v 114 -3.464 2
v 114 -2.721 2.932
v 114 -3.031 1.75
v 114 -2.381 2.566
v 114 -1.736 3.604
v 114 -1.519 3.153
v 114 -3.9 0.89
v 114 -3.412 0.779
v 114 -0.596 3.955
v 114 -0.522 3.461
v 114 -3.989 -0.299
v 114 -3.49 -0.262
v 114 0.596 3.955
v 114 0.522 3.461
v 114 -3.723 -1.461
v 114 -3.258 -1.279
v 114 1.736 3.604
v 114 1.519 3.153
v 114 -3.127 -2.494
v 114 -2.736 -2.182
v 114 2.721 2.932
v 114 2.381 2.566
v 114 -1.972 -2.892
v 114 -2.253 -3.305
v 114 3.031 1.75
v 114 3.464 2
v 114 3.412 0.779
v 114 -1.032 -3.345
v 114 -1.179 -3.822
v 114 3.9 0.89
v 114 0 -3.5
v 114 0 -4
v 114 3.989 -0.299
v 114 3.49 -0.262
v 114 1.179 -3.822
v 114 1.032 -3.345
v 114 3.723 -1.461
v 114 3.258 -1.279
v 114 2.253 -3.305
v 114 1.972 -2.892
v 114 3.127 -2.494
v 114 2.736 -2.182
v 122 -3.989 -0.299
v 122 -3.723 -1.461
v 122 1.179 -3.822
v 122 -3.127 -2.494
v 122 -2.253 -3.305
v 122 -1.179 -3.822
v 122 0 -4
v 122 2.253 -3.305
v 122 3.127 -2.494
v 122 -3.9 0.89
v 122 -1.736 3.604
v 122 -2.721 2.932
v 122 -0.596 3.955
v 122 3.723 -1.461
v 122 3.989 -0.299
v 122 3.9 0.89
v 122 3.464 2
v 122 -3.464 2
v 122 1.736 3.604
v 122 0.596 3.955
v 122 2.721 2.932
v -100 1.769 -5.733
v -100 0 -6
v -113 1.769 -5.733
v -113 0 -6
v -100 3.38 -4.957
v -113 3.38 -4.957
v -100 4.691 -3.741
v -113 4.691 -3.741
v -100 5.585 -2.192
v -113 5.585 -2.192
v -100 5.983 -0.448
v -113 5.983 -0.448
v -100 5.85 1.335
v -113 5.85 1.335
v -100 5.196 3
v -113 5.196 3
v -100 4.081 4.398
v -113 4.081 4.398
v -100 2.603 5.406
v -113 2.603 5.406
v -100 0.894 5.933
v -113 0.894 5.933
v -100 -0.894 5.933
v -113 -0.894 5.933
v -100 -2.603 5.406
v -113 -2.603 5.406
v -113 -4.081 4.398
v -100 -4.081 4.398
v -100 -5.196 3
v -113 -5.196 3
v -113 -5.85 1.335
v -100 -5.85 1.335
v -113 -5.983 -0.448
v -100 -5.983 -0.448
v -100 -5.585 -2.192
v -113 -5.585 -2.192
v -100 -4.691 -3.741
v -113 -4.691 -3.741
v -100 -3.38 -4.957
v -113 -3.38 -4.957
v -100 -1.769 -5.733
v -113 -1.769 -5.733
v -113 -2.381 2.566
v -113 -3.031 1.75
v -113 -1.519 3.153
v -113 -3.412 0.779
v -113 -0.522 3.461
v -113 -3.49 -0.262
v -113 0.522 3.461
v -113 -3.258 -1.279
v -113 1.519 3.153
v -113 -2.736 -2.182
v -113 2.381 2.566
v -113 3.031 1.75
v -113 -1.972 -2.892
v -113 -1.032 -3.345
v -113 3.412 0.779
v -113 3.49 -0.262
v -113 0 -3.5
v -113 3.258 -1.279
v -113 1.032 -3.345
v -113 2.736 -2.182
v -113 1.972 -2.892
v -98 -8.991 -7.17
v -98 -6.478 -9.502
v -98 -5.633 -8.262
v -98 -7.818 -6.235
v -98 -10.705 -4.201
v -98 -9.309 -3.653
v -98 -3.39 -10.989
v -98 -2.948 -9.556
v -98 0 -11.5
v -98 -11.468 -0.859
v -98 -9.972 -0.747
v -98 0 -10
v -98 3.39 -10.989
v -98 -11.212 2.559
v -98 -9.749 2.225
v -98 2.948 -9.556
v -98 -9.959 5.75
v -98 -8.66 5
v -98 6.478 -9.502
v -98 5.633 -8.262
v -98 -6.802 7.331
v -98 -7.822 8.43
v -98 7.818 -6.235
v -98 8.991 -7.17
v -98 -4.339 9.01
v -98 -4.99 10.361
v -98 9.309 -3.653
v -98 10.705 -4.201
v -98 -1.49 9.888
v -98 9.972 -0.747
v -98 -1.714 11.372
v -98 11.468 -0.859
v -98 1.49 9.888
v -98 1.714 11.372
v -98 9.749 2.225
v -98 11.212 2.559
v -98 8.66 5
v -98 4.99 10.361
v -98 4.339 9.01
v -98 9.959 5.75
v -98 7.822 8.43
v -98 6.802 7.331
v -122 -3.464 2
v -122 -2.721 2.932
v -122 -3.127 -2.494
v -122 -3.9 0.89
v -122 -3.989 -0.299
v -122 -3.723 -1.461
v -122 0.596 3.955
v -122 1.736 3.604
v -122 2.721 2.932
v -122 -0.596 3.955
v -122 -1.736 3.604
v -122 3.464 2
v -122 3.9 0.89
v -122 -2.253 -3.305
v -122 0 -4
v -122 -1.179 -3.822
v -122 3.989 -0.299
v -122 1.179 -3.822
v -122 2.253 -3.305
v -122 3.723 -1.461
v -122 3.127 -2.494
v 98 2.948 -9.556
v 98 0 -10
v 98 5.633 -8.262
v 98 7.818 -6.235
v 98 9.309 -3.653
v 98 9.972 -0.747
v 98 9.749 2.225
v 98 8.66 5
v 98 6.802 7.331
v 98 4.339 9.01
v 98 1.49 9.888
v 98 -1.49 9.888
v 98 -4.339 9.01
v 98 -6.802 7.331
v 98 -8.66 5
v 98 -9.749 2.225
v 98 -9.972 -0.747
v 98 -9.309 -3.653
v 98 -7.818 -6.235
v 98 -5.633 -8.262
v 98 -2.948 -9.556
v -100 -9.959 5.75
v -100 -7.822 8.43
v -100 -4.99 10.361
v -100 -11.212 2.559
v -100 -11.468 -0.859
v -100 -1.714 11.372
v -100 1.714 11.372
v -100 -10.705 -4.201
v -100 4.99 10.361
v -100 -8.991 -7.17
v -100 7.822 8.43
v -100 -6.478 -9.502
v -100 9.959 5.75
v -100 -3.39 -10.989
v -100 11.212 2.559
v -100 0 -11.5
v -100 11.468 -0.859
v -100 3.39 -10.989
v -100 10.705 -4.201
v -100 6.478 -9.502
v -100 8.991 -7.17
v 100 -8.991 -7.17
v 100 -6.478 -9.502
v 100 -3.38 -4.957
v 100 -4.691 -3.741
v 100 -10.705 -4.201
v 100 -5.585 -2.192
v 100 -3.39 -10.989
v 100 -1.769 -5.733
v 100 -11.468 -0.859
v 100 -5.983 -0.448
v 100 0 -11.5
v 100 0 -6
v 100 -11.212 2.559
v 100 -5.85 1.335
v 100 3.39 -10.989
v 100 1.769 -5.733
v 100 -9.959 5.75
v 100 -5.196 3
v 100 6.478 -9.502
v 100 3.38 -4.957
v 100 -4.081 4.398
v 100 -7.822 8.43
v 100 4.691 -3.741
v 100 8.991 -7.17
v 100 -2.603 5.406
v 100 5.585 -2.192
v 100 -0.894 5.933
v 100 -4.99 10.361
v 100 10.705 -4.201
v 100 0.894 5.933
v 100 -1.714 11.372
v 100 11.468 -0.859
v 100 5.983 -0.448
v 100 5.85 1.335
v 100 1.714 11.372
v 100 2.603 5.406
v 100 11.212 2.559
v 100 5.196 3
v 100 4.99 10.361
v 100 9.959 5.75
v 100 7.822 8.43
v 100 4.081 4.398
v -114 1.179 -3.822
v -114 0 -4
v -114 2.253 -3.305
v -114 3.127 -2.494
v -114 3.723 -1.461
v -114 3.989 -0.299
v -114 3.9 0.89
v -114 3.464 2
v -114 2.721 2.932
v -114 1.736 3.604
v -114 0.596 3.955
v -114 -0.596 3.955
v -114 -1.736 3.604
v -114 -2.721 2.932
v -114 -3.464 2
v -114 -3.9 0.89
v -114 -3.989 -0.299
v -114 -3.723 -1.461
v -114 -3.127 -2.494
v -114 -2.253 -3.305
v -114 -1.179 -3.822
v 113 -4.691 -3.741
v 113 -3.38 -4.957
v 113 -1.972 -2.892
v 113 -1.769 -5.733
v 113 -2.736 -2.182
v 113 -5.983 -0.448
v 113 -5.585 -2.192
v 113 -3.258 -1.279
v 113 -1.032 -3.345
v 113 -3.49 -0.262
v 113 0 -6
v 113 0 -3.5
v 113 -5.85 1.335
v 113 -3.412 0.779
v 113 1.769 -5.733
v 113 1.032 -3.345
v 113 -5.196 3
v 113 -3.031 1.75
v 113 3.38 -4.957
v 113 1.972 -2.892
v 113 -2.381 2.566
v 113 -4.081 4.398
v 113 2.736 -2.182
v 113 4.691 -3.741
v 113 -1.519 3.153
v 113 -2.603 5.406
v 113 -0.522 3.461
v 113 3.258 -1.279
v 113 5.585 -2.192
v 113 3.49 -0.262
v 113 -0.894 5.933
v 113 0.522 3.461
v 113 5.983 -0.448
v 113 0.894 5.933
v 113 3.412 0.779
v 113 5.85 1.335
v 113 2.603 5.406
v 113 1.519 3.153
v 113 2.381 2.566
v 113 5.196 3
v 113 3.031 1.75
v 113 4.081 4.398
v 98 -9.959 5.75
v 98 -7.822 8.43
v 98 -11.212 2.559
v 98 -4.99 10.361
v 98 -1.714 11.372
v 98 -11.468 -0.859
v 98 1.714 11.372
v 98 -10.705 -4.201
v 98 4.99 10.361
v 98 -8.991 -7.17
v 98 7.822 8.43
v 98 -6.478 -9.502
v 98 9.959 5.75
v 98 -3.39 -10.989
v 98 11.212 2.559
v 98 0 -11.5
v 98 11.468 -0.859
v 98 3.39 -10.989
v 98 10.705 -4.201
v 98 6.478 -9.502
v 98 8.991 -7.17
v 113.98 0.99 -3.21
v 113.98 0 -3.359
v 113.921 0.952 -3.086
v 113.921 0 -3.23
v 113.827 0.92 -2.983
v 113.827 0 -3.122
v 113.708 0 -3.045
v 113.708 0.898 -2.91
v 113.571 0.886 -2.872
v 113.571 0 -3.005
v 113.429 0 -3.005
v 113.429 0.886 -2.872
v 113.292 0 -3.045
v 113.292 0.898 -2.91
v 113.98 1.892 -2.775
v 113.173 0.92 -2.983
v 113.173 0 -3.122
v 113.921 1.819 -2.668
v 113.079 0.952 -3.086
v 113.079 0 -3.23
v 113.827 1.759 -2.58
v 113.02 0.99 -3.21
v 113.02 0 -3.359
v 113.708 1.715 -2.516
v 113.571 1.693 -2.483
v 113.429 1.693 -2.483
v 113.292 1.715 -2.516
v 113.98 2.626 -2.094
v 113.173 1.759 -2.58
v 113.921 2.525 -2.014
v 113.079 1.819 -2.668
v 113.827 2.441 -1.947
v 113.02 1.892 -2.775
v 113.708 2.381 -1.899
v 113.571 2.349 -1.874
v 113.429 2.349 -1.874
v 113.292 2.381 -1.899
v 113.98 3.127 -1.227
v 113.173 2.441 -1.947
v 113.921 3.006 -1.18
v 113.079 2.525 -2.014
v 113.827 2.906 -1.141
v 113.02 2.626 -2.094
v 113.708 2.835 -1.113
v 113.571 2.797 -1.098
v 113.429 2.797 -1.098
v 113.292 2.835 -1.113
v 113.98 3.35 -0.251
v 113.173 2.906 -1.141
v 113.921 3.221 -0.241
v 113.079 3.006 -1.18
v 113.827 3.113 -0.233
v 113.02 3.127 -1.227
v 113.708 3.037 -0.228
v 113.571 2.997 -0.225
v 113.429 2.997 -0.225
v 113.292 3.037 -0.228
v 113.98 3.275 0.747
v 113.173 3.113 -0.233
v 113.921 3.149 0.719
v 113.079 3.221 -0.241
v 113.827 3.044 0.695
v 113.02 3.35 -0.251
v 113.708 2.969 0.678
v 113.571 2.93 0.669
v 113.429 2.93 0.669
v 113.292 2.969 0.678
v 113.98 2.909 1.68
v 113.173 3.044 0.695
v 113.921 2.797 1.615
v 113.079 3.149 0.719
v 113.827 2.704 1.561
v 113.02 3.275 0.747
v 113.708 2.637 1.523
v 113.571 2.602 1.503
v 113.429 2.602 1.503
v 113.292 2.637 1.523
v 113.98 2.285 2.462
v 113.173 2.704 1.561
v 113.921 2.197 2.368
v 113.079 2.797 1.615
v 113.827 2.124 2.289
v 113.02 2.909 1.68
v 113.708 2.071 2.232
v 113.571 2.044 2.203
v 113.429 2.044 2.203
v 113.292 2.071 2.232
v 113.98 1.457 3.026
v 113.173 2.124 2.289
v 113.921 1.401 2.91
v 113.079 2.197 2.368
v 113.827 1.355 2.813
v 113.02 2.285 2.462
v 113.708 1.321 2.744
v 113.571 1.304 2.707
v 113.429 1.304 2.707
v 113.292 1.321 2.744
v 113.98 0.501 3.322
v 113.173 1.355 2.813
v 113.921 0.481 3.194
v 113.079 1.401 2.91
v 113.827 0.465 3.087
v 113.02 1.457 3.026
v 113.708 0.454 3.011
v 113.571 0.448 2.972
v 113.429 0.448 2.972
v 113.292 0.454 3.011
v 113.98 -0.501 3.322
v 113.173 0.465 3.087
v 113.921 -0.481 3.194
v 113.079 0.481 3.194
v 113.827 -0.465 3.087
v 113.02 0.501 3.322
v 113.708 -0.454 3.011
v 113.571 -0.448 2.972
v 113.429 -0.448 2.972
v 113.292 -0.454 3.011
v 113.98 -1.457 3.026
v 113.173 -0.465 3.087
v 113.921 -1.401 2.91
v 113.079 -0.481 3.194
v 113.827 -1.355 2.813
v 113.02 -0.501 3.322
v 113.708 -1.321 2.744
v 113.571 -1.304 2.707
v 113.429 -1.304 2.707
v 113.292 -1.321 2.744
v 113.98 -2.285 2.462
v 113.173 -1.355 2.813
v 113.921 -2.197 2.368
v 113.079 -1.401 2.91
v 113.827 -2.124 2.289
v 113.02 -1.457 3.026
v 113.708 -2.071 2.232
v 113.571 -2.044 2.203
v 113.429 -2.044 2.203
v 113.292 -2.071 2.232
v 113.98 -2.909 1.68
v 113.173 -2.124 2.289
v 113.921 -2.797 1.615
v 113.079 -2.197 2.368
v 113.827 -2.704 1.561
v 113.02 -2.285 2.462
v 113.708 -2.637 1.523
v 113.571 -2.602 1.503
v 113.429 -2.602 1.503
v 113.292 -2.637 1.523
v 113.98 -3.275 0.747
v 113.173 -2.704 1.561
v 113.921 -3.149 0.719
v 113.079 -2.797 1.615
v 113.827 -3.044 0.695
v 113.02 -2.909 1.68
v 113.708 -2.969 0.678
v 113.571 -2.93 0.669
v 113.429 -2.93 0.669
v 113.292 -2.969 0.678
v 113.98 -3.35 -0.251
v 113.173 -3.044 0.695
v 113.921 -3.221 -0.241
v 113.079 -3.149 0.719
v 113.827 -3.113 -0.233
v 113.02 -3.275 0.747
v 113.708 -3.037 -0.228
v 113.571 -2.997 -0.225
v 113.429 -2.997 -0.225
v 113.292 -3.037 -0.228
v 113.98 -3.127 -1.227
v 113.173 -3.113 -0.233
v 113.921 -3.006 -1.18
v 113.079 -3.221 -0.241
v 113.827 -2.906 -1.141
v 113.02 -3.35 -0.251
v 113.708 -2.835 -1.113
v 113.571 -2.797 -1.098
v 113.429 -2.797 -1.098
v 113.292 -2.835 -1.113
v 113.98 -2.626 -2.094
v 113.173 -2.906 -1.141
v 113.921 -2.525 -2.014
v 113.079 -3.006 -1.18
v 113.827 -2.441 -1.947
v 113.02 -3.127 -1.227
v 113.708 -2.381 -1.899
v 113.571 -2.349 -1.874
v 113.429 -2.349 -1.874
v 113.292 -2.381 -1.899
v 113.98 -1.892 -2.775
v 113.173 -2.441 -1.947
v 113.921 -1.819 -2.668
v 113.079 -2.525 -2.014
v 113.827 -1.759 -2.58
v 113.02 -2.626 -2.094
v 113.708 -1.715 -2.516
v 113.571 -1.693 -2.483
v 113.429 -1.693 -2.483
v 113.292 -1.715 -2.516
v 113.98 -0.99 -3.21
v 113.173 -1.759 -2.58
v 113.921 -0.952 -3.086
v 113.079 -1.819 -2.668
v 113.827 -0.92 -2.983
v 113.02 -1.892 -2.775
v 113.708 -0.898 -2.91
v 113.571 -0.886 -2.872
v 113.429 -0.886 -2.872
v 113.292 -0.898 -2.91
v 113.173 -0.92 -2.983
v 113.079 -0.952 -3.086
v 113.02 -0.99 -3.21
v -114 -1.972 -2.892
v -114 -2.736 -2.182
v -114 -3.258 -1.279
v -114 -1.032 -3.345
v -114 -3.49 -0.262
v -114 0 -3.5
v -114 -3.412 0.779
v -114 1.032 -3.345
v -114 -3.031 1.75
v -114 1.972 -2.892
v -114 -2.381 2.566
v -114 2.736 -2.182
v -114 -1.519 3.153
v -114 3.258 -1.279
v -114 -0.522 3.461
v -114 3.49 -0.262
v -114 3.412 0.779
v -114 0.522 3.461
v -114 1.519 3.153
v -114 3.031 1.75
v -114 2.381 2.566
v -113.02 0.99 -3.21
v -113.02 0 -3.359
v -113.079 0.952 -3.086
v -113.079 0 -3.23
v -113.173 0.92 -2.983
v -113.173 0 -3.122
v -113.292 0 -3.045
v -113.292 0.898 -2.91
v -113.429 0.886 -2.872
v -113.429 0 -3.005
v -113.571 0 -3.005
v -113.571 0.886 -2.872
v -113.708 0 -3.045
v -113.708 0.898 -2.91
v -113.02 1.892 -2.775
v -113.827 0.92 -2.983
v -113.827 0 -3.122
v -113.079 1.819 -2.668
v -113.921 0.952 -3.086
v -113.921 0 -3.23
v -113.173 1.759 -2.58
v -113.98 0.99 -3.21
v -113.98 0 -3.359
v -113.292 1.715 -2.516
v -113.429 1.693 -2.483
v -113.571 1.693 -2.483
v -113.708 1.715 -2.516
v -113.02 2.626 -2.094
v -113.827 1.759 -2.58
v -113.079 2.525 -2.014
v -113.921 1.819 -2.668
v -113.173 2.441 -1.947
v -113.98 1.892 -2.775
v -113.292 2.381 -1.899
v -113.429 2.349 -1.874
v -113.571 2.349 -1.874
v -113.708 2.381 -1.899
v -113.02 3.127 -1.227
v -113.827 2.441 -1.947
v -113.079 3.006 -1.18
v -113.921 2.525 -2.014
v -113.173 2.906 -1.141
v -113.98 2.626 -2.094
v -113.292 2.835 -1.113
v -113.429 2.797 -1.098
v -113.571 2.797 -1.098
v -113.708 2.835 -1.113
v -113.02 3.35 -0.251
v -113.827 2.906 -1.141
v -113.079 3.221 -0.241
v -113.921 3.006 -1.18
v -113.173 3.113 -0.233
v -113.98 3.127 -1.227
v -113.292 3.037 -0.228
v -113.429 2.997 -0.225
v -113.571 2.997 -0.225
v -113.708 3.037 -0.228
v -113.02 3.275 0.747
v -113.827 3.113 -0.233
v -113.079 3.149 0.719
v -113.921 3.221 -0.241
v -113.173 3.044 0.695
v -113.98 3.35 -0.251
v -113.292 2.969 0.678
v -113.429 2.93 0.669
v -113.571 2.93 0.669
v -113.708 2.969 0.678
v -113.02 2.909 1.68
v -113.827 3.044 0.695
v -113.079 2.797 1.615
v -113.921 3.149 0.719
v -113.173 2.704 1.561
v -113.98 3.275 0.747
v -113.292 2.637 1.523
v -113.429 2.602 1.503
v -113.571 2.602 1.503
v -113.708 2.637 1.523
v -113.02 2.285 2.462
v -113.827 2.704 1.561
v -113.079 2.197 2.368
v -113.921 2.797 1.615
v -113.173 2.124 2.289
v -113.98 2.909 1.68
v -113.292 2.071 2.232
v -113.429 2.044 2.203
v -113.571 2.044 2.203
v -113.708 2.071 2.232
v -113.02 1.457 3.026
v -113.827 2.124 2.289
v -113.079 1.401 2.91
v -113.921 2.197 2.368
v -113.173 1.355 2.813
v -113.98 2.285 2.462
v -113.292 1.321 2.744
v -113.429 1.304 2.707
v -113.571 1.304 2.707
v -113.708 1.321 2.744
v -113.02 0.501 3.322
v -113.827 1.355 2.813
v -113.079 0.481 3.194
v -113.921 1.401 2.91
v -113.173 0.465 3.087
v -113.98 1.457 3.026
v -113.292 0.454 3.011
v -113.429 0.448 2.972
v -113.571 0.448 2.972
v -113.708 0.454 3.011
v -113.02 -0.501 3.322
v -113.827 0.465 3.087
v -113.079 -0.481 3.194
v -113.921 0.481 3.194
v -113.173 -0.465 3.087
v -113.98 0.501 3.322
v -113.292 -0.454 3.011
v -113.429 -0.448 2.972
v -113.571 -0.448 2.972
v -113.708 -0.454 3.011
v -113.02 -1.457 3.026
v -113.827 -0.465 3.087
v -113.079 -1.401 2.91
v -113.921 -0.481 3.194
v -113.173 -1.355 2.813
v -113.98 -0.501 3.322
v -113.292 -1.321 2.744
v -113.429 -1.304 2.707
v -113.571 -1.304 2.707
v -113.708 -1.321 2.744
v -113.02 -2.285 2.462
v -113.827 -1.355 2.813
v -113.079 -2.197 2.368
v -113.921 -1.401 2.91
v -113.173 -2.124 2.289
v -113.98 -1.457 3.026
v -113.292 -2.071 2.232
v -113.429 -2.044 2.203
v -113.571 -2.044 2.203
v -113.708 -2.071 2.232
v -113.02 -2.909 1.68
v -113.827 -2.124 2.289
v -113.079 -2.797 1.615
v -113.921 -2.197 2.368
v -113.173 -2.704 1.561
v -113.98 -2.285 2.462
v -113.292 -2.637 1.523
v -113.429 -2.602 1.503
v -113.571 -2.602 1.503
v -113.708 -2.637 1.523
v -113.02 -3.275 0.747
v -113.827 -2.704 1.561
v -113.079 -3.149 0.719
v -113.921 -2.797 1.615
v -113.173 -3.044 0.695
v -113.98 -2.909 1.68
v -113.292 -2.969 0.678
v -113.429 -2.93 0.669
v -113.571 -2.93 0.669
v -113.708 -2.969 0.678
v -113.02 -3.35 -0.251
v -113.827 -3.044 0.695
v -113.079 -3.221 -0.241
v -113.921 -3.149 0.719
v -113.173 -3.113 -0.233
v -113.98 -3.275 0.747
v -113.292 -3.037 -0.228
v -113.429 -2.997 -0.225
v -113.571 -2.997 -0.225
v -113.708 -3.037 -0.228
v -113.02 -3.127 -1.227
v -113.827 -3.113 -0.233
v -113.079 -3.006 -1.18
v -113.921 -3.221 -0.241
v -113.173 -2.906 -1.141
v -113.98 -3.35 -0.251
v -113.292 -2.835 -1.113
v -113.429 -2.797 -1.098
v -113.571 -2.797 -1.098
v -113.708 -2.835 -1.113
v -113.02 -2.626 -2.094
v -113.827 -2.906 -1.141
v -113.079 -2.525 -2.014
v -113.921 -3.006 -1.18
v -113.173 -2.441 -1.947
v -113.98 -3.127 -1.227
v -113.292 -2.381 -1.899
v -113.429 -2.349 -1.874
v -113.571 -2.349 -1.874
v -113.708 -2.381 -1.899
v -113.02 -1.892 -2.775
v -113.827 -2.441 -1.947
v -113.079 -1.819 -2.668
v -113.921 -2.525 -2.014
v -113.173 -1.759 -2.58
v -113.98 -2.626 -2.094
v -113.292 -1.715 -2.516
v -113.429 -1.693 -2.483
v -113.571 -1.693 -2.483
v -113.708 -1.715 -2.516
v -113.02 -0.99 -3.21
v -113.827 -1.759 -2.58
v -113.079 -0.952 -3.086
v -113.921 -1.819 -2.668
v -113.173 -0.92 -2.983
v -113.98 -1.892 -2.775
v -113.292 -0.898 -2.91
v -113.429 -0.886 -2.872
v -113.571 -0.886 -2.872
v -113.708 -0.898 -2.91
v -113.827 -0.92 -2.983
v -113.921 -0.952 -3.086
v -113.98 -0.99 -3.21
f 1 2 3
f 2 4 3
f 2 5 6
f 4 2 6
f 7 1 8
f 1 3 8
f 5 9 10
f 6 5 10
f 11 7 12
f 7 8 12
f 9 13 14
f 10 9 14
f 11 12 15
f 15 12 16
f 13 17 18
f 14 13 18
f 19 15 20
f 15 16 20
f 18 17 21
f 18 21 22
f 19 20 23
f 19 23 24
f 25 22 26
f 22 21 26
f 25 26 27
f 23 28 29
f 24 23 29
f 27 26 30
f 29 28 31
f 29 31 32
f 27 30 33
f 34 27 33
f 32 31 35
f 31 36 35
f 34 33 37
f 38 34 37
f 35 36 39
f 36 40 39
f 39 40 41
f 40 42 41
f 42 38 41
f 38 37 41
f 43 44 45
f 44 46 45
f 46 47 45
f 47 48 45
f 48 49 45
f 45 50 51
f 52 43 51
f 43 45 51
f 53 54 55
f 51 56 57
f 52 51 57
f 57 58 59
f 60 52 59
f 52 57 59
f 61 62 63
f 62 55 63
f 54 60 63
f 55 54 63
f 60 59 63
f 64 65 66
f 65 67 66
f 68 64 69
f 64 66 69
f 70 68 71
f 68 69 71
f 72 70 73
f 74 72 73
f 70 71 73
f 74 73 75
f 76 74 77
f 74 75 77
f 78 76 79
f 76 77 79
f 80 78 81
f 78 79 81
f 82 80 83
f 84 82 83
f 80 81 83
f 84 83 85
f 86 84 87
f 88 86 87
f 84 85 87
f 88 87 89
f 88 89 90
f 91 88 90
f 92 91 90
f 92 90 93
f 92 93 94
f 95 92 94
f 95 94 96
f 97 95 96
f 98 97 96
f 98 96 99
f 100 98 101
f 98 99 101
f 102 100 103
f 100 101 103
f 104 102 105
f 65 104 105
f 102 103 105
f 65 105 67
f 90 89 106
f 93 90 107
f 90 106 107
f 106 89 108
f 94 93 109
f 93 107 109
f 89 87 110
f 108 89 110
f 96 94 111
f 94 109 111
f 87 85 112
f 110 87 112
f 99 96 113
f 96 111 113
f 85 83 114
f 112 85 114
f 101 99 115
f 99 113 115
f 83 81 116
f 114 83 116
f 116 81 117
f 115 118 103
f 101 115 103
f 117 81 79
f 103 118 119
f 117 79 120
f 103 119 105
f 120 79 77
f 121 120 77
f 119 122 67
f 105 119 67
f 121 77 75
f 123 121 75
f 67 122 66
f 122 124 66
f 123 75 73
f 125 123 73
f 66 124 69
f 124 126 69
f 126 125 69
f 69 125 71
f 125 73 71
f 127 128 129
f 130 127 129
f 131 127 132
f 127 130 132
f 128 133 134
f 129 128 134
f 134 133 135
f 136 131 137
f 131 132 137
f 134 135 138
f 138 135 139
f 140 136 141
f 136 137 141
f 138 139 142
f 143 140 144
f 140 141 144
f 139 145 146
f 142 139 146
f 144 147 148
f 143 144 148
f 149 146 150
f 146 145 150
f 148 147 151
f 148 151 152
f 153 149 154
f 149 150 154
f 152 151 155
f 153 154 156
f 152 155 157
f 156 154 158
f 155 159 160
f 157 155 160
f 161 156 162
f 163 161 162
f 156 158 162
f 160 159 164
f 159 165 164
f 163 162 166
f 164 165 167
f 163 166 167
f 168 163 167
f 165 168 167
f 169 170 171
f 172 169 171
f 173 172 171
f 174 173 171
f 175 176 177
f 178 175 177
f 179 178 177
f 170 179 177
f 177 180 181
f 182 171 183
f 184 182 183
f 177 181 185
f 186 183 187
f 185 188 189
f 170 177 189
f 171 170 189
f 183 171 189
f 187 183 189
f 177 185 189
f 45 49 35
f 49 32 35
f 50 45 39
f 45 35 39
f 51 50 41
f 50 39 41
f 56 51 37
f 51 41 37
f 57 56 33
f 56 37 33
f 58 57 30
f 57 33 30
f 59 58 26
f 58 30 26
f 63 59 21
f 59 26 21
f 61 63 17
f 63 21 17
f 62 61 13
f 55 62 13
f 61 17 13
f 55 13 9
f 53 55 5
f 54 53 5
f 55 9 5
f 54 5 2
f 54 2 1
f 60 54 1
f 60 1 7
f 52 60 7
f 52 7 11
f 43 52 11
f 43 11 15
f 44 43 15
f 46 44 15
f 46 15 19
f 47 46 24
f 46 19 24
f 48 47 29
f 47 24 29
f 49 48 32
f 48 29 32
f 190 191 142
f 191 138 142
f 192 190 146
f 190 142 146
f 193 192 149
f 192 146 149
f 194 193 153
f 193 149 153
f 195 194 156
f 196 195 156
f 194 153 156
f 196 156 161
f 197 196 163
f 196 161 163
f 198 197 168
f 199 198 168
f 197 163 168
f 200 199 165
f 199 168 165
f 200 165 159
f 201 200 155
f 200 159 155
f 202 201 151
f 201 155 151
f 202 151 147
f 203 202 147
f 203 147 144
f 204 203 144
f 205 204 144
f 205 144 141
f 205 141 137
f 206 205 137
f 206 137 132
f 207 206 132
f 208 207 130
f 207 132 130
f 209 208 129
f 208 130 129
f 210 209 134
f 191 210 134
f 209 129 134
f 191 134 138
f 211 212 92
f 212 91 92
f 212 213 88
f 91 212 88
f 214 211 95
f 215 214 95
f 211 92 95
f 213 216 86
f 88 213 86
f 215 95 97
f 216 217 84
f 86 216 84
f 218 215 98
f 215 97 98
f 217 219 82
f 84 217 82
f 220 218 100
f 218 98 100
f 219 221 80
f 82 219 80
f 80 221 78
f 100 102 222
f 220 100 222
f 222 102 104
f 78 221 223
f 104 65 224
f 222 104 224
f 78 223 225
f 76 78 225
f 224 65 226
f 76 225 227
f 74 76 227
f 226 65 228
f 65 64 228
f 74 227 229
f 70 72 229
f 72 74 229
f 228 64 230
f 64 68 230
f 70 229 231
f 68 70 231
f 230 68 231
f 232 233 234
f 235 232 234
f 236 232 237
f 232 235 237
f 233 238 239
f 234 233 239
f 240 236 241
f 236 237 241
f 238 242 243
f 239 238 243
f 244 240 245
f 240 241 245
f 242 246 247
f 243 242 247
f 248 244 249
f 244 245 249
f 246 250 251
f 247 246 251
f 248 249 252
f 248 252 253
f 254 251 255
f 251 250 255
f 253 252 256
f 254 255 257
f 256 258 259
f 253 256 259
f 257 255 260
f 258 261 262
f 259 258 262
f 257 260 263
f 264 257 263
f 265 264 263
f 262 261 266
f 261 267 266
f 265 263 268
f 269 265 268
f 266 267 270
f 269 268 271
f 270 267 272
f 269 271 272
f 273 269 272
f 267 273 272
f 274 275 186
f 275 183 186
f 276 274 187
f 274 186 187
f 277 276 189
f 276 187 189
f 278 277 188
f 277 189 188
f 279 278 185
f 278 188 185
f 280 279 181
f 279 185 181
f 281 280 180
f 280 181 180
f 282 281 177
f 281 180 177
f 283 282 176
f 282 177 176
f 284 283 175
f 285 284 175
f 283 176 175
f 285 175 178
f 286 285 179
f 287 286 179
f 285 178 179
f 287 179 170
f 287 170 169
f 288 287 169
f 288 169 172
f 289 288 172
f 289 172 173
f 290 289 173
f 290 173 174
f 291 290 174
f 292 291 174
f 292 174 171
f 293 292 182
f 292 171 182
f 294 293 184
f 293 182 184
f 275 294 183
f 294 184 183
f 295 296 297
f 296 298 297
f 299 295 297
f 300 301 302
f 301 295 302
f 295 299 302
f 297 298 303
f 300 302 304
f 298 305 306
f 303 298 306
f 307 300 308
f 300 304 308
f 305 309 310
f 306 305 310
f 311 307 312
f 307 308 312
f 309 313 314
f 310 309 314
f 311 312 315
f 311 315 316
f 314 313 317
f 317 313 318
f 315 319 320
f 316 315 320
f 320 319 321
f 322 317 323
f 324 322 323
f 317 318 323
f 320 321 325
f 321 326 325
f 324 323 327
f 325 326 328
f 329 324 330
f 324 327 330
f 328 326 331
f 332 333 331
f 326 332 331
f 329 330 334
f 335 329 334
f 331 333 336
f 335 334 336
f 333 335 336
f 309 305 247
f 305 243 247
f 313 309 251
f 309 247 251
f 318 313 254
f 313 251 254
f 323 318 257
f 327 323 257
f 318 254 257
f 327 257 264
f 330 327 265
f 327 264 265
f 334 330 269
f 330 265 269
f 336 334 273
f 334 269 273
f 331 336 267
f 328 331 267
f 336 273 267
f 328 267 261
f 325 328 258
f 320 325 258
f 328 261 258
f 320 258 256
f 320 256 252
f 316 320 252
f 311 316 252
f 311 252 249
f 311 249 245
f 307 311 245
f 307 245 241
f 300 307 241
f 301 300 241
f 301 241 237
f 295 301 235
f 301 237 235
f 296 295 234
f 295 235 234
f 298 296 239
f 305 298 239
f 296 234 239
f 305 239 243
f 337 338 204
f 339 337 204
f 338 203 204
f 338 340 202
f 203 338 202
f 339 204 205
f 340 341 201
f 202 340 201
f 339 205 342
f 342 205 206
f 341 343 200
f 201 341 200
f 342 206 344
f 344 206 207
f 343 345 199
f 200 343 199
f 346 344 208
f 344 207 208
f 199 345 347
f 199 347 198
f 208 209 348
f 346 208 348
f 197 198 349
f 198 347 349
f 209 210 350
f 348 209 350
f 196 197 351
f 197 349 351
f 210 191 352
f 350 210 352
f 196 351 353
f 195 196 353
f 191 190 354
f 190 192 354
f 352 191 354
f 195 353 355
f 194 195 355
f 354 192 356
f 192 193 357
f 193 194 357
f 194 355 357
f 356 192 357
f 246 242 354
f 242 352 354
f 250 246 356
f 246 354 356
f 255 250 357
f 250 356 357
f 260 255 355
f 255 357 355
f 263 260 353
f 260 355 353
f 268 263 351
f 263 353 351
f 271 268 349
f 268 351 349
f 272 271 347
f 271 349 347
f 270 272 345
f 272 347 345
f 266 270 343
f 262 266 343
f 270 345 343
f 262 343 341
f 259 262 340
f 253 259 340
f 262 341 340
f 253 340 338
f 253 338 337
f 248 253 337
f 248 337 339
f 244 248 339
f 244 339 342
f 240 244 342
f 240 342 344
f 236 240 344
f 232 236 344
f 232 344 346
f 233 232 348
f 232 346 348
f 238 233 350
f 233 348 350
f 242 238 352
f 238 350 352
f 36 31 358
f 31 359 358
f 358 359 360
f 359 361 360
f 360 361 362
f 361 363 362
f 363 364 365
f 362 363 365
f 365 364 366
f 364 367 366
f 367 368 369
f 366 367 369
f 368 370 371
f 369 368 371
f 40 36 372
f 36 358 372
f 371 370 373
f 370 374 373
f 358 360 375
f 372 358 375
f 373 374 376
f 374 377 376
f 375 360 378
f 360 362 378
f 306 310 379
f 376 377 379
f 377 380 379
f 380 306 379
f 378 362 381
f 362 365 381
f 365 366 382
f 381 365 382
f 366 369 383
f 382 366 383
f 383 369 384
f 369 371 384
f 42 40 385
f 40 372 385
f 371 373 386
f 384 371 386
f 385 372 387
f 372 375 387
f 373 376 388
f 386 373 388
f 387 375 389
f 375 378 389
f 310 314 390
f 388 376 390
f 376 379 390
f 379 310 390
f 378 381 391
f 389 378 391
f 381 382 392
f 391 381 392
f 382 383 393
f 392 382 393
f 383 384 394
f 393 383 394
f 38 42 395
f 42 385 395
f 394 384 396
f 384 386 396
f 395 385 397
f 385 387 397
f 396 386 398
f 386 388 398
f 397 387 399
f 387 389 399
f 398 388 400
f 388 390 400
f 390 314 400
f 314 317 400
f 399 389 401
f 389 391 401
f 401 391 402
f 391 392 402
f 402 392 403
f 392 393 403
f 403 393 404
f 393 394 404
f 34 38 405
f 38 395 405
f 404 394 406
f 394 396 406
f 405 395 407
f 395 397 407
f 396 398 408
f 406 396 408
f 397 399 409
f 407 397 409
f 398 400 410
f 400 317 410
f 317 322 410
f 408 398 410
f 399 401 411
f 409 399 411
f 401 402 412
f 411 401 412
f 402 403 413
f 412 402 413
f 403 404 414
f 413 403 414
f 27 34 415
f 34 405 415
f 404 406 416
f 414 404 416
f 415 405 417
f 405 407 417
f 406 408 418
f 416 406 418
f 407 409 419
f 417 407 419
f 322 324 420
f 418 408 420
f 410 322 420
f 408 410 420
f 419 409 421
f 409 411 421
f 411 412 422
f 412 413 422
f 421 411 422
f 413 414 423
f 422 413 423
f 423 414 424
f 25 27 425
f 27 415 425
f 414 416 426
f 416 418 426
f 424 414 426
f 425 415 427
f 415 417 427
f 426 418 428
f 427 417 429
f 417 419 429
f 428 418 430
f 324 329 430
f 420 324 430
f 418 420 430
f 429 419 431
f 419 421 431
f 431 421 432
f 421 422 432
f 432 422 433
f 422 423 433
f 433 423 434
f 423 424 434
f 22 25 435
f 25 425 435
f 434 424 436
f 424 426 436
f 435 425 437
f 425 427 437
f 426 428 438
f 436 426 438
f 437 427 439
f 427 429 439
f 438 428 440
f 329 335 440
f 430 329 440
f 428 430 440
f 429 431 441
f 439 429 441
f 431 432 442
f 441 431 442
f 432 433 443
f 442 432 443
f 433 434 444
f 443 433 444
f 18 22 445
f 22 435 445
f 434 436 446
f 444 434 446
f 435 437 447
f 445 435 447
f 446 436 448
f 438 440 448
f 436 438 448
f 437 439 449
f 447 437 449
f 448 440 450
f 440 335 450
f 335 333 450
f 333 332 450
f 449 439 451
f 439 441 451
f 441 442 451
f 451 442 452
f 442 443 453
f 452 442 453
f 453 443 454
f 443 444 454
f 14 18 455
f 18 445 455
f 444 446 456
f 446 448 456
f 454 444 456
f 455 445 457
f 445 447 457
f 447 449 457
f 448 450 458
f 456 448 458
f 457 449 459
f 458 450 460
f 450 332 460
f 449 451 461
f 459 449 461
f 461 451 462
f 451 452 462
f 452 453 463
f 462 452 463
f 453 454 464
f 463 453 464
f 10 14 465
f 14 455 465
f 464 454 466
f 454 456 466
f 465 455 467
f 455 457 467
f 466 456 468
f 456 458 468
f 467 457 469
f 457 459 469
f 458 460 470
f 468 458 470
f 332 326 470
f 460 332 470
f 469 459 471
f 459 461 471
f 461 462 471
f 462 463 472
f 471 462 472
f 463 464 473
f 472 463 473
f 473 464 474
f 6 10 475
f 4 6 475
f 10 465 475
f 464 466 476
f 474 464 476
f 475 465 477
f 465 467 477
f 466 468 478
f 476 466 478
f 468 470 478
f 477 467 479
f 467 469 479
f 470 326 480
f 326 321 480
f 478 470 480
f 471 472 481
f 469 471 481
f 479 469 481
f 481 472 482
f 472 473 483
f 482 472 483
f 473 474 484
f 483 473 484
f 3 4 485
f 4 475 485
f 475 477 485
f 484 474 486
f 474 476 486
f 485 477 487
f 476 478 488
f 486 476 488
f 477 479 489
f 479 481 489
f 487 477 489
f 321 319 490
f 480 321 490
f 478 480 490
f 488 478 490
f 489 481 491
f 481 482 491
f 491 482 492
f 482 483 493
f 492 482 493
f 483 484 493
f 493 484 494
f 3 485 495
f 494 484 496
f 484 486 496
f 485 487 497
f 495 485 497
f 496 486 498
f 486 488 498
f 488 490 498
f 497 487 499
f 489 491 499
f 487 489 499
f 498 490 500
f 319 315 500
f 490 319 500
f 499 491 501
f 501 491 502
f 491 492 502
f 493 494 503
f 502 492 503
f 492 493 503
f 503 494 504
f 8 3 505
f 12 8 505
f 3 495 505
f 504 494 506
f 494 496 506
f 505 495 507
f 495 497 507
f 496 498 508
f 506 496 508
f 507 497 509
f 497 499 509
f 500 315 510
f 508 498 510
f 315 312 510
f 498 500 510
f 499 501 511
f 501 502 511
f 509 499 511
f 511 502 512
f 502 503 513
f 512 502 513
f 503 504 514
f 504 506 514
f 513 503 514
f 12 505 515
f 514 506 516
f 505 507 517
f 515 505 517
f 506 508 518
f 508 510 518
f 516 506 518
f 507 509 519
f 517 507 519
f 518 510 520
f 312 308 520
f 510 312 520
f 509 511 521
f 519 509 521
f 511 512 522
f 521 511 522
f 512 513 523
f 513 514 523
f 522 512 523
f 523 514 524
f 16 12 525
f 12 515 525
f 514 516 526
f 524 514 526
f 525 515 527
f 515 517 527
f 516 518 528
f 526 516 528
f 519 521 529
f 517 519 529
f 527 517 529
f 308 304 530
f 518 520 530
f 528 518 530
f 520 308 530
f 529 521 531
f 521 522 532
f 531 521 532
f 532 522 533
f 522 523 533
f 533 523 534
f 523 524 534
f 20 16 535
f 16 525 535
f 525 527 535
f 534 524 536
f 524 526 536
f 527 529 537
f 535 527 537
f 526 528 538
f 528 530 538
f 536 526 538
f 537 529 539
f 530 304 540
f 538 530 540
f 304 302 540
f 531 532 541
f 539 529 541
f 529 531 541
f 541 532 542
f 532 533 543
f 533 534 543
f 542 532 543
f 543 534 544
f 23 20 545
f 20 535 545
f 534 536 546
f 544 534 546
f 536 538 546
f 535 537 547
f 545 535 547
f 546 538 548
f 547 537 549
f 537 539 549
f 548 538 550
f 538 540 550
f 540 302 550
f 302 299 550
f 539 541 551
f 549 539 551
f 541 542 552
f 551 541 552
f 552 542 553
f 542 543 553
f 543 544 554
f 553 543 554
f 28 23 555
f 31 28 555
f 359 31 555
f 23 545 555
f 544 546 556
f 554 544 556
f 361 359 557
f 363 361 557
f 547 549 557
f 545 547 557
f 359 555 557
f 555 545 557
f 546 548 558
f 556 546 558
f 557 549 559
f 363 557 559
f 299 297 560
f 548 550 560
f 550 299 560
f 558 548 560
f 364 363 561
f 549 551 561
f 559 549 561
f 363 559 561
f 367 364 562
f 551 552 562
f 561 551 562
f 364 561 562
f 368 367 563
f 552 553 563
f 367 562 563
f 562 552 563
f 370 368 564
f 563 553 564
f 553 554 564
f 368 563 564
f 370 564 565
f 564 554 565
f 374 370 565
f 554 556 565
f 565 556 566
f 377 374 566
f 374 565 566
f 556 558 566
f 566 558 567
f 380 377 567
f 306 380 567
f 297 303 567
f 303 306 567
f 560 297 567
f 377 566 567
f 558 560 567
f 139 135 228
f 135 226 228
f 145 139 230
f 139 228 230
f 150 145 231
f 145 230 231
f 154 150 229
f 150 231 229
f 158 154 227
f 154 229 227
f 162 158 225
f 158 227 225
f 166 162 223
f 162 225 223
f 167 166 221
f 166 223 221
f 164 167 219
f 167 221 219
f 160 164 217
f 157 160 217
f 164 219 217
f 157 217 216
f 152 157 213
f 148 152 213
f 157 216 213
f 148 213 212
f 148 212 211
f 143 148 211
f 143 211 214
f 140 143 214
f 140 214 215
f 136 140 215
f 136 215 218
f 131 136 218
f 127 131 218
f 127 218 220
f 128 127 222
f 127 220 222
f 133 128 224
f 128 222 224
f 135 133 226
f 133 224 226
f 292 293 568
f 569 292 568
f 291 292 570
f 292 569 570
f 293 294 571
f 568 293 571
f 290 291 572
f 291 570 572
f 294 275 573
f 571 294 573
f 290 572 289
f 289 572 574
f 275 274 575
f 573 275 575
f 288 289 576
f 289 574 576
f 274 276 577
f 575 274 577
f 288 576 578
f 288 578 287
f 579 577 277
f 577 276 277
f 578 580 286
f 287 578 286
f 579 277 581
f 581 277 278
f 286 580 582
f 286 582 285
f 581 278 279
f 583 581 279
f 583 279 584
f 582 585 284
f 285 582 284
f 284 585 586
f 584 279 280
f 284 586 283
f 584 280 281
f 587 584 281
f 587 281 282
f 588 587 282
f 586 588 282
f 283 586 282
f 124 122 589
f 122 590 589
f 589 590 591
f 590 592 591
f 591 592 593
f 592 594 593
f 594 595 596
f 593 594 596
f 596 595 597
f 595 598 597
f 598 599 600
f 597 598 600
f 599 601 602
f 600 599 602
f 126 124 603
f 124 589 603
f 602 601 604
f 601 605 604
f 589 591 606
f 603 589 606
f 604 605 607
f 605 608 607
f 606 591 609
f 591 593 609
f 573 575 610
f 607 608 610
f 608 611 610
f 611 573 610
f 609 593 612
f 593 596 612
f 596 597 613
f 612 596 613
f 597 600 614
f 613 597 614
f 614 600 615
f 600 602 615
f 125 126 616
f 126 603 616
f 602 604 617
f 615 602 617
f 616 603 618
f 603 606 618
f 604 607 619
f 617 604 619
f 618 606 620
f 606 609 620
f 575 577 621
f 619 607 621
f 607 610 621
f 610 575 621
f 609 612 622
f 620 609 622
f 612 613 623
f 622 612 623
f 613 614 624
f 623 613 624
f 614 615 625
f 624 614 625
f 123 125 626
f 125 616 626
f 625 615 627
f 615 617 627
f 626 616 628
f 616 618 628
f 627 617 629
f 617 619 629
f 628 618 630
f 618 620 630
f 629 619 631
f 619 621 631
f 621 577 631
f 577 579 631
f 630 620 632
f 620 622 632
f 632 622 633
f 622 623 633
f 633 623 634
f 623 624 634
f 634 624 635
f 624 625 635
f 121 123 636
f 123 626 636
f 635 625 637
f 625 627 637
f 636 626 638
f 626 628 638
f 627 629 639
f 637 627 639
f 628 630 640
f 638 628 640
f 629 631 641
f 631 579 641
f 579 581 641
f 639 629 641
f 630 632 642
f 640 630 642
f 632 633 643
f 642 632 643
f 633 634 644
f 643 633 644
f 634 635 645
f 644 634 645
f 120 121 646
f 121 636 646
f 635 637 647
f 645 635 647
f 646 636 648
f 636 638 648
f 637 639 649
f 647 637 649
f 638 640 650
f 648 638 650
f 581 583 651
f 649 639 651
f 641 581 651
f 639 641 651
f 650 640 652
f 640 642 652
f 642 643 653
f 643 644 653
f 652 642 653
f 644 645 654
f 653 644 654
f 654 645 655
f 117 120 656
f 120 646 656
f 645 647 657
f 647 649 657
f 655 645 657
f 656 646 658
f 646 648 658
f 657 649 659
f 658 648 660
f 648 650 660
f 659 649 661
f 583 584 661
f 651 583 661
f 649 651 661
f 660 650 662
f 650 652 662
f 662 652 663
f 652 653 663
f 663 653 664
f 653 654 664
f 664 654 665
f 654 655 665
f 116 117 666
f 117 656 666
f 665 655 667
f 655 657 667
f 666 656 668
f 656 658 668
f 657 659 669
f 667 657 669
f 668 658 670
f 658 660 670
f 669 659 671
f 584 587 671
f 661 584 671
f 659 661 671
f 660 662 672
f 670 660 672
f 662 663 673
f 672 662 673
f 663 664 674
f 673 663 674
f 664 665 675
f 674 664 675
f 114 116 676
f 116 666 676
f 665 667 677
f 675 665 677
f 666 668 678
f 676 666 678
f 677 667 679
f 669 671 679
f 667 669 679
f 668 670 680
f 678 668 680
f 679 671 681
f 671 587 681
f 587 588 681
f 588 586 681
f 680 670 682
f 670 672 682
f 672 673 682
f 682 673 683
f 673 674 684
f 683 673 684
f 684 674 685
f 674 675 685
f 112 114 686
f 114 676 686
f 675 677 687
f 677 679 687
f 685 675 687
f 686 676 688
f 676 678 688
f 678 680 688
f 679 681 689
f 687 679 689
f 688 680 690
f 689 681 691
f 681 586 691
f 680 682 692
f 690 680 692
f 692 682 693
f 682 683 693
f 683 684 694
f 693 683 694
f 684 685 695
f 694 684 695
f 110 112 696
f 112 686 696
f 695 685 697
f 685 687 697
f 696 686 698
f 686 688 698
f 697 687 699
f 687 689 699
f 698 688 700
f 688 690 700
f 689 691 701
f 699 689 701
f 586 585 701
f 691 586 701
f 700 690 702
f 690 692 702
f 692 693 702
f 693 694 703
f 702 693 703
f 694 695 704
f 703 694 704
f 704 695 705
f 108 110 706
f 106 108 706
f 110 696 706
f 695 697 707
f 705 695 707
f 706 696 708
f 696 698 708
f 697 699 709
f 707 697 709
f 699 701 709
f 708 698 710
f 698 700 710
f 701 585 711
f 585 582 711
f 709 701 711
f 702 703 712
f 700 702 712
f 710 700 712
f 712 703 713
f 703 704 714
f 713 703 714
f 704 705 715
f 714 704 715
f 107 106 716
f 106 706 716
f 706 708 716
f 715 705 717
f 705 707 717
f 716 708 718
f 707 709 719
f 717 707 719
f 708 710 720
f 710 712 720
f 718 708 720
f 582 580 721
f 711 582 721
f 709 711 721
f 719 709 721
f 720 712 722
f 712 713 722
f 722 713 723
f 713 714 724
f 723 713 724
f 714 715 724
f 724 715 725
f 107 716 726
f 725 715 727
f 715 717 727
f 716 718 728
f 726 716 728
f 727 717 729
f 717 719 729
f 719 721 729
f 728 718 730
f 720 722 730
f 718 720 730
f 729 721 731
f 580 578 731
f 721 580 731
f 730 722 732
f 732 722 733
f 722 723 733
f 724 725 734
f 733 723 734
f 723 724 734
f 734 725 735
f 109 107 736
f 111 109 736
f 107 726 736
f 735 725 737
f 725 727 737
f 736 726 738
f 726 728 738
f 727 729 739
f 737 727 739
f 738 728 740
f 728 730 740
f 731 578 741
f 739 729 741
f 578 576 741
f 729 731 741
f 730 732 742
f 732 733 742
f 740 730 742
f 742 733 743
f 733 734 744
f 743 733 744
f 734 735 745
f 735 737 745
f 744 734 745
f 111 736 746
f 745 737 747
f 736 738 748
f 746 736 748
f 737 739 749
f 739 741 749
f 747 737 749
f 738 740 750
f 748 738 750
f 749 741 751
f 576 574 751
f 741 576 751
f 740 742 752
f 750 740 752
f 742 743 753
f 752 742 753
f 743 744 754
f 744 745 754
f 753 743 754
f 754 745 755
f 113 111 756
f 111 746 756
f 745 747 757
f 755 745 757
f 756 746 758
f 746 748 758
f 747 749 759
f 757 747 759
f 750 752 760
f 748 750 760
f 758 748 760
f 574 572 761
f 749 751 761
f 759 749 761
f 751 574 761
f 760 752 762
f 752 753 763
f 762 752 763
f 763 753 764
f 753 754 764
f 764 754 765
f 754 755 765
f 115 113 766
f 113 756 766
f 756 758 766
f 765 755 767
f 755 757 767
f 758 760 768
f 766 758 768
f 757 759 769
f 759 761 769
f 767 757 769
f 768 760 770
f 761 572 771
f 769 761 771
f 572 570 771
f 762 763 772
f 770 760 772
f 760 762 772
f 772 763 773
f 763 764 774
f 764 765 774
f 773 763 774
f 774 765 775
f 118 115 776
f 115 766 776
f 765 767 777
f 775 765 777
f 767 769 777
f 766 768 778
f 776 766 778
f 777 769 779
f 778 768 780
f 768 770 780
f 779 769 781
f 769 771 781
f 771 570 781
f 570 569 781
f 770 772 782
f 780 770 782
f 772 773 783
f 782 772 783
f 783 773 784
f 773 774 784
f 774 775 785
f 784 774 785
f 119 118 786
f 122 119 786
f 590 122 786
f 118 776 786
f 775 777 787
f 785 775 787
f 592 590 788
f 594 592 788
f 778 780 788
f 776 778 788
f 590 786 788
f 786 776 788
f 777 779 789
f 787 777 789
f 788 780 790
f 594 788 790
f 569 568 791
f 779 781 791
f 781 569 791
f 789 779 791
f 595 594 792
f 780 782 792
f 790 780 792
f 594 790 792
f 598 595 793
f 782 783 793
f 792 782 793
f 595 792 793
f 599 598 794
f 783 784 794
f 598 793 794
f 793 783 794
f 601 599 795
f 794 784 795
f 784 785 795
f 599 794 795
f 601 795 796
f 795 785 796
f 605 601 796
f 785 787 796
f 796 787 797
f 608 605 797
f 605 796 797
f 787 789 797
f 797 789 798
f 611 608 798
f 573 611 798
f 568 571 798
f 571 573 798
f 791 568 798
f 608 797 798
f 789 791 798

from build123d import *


with BuildPart() as part:
    # Sketch1 → Revolve1 (revolve)
    with BuildSketch(Plane.XY, mode=Mode.PRIVATE) as revolve1_sk:
        with BuildLine():
            Line((-122, 4), (-122, 0))
            Line((-122, 0), (122, 0))
            Line((122, 0), (122, 4))
            Line((122, 4), (114, 4))
            Line((114, 4), (114, 3.5))
            ThreePointArc((114, 3.5), (113.5, 3), (113, 3.5))
            Line((113, 3.5), (113, 6))
            Line((113, 6), (100, 6))
            Line((100, 6), (100, 11.5))
            Line((100, 11.5), (98, 11.5))
            Line((98, 11.5), (98, 10))
            Line((98, 10), (-98, 10))
            Line((-98, 10), (-98, 11.5))
            Line((-98, 11.5), (-100, 11.5))
            Line((-100, 11.5), (-100, 6))
            Line((-100, 6), (-113, 6))
            Line((-113, 6), (-113, 3.5))
            ThreePointArc((-113, 3.5), (-113.5, 3), (-114, 3.5))
            Line((-114, 3.5), (-114, 4))
            Line((-114, 4), (-122, 4))
        make_face()
    revolve(revolve1_sk.sketch.rotate(Axis((-122, 0, 0), (1, 0, 0)), 270), axis=Axis((-122, 0, 0), (1, 0, 0)))


solid = part.part
